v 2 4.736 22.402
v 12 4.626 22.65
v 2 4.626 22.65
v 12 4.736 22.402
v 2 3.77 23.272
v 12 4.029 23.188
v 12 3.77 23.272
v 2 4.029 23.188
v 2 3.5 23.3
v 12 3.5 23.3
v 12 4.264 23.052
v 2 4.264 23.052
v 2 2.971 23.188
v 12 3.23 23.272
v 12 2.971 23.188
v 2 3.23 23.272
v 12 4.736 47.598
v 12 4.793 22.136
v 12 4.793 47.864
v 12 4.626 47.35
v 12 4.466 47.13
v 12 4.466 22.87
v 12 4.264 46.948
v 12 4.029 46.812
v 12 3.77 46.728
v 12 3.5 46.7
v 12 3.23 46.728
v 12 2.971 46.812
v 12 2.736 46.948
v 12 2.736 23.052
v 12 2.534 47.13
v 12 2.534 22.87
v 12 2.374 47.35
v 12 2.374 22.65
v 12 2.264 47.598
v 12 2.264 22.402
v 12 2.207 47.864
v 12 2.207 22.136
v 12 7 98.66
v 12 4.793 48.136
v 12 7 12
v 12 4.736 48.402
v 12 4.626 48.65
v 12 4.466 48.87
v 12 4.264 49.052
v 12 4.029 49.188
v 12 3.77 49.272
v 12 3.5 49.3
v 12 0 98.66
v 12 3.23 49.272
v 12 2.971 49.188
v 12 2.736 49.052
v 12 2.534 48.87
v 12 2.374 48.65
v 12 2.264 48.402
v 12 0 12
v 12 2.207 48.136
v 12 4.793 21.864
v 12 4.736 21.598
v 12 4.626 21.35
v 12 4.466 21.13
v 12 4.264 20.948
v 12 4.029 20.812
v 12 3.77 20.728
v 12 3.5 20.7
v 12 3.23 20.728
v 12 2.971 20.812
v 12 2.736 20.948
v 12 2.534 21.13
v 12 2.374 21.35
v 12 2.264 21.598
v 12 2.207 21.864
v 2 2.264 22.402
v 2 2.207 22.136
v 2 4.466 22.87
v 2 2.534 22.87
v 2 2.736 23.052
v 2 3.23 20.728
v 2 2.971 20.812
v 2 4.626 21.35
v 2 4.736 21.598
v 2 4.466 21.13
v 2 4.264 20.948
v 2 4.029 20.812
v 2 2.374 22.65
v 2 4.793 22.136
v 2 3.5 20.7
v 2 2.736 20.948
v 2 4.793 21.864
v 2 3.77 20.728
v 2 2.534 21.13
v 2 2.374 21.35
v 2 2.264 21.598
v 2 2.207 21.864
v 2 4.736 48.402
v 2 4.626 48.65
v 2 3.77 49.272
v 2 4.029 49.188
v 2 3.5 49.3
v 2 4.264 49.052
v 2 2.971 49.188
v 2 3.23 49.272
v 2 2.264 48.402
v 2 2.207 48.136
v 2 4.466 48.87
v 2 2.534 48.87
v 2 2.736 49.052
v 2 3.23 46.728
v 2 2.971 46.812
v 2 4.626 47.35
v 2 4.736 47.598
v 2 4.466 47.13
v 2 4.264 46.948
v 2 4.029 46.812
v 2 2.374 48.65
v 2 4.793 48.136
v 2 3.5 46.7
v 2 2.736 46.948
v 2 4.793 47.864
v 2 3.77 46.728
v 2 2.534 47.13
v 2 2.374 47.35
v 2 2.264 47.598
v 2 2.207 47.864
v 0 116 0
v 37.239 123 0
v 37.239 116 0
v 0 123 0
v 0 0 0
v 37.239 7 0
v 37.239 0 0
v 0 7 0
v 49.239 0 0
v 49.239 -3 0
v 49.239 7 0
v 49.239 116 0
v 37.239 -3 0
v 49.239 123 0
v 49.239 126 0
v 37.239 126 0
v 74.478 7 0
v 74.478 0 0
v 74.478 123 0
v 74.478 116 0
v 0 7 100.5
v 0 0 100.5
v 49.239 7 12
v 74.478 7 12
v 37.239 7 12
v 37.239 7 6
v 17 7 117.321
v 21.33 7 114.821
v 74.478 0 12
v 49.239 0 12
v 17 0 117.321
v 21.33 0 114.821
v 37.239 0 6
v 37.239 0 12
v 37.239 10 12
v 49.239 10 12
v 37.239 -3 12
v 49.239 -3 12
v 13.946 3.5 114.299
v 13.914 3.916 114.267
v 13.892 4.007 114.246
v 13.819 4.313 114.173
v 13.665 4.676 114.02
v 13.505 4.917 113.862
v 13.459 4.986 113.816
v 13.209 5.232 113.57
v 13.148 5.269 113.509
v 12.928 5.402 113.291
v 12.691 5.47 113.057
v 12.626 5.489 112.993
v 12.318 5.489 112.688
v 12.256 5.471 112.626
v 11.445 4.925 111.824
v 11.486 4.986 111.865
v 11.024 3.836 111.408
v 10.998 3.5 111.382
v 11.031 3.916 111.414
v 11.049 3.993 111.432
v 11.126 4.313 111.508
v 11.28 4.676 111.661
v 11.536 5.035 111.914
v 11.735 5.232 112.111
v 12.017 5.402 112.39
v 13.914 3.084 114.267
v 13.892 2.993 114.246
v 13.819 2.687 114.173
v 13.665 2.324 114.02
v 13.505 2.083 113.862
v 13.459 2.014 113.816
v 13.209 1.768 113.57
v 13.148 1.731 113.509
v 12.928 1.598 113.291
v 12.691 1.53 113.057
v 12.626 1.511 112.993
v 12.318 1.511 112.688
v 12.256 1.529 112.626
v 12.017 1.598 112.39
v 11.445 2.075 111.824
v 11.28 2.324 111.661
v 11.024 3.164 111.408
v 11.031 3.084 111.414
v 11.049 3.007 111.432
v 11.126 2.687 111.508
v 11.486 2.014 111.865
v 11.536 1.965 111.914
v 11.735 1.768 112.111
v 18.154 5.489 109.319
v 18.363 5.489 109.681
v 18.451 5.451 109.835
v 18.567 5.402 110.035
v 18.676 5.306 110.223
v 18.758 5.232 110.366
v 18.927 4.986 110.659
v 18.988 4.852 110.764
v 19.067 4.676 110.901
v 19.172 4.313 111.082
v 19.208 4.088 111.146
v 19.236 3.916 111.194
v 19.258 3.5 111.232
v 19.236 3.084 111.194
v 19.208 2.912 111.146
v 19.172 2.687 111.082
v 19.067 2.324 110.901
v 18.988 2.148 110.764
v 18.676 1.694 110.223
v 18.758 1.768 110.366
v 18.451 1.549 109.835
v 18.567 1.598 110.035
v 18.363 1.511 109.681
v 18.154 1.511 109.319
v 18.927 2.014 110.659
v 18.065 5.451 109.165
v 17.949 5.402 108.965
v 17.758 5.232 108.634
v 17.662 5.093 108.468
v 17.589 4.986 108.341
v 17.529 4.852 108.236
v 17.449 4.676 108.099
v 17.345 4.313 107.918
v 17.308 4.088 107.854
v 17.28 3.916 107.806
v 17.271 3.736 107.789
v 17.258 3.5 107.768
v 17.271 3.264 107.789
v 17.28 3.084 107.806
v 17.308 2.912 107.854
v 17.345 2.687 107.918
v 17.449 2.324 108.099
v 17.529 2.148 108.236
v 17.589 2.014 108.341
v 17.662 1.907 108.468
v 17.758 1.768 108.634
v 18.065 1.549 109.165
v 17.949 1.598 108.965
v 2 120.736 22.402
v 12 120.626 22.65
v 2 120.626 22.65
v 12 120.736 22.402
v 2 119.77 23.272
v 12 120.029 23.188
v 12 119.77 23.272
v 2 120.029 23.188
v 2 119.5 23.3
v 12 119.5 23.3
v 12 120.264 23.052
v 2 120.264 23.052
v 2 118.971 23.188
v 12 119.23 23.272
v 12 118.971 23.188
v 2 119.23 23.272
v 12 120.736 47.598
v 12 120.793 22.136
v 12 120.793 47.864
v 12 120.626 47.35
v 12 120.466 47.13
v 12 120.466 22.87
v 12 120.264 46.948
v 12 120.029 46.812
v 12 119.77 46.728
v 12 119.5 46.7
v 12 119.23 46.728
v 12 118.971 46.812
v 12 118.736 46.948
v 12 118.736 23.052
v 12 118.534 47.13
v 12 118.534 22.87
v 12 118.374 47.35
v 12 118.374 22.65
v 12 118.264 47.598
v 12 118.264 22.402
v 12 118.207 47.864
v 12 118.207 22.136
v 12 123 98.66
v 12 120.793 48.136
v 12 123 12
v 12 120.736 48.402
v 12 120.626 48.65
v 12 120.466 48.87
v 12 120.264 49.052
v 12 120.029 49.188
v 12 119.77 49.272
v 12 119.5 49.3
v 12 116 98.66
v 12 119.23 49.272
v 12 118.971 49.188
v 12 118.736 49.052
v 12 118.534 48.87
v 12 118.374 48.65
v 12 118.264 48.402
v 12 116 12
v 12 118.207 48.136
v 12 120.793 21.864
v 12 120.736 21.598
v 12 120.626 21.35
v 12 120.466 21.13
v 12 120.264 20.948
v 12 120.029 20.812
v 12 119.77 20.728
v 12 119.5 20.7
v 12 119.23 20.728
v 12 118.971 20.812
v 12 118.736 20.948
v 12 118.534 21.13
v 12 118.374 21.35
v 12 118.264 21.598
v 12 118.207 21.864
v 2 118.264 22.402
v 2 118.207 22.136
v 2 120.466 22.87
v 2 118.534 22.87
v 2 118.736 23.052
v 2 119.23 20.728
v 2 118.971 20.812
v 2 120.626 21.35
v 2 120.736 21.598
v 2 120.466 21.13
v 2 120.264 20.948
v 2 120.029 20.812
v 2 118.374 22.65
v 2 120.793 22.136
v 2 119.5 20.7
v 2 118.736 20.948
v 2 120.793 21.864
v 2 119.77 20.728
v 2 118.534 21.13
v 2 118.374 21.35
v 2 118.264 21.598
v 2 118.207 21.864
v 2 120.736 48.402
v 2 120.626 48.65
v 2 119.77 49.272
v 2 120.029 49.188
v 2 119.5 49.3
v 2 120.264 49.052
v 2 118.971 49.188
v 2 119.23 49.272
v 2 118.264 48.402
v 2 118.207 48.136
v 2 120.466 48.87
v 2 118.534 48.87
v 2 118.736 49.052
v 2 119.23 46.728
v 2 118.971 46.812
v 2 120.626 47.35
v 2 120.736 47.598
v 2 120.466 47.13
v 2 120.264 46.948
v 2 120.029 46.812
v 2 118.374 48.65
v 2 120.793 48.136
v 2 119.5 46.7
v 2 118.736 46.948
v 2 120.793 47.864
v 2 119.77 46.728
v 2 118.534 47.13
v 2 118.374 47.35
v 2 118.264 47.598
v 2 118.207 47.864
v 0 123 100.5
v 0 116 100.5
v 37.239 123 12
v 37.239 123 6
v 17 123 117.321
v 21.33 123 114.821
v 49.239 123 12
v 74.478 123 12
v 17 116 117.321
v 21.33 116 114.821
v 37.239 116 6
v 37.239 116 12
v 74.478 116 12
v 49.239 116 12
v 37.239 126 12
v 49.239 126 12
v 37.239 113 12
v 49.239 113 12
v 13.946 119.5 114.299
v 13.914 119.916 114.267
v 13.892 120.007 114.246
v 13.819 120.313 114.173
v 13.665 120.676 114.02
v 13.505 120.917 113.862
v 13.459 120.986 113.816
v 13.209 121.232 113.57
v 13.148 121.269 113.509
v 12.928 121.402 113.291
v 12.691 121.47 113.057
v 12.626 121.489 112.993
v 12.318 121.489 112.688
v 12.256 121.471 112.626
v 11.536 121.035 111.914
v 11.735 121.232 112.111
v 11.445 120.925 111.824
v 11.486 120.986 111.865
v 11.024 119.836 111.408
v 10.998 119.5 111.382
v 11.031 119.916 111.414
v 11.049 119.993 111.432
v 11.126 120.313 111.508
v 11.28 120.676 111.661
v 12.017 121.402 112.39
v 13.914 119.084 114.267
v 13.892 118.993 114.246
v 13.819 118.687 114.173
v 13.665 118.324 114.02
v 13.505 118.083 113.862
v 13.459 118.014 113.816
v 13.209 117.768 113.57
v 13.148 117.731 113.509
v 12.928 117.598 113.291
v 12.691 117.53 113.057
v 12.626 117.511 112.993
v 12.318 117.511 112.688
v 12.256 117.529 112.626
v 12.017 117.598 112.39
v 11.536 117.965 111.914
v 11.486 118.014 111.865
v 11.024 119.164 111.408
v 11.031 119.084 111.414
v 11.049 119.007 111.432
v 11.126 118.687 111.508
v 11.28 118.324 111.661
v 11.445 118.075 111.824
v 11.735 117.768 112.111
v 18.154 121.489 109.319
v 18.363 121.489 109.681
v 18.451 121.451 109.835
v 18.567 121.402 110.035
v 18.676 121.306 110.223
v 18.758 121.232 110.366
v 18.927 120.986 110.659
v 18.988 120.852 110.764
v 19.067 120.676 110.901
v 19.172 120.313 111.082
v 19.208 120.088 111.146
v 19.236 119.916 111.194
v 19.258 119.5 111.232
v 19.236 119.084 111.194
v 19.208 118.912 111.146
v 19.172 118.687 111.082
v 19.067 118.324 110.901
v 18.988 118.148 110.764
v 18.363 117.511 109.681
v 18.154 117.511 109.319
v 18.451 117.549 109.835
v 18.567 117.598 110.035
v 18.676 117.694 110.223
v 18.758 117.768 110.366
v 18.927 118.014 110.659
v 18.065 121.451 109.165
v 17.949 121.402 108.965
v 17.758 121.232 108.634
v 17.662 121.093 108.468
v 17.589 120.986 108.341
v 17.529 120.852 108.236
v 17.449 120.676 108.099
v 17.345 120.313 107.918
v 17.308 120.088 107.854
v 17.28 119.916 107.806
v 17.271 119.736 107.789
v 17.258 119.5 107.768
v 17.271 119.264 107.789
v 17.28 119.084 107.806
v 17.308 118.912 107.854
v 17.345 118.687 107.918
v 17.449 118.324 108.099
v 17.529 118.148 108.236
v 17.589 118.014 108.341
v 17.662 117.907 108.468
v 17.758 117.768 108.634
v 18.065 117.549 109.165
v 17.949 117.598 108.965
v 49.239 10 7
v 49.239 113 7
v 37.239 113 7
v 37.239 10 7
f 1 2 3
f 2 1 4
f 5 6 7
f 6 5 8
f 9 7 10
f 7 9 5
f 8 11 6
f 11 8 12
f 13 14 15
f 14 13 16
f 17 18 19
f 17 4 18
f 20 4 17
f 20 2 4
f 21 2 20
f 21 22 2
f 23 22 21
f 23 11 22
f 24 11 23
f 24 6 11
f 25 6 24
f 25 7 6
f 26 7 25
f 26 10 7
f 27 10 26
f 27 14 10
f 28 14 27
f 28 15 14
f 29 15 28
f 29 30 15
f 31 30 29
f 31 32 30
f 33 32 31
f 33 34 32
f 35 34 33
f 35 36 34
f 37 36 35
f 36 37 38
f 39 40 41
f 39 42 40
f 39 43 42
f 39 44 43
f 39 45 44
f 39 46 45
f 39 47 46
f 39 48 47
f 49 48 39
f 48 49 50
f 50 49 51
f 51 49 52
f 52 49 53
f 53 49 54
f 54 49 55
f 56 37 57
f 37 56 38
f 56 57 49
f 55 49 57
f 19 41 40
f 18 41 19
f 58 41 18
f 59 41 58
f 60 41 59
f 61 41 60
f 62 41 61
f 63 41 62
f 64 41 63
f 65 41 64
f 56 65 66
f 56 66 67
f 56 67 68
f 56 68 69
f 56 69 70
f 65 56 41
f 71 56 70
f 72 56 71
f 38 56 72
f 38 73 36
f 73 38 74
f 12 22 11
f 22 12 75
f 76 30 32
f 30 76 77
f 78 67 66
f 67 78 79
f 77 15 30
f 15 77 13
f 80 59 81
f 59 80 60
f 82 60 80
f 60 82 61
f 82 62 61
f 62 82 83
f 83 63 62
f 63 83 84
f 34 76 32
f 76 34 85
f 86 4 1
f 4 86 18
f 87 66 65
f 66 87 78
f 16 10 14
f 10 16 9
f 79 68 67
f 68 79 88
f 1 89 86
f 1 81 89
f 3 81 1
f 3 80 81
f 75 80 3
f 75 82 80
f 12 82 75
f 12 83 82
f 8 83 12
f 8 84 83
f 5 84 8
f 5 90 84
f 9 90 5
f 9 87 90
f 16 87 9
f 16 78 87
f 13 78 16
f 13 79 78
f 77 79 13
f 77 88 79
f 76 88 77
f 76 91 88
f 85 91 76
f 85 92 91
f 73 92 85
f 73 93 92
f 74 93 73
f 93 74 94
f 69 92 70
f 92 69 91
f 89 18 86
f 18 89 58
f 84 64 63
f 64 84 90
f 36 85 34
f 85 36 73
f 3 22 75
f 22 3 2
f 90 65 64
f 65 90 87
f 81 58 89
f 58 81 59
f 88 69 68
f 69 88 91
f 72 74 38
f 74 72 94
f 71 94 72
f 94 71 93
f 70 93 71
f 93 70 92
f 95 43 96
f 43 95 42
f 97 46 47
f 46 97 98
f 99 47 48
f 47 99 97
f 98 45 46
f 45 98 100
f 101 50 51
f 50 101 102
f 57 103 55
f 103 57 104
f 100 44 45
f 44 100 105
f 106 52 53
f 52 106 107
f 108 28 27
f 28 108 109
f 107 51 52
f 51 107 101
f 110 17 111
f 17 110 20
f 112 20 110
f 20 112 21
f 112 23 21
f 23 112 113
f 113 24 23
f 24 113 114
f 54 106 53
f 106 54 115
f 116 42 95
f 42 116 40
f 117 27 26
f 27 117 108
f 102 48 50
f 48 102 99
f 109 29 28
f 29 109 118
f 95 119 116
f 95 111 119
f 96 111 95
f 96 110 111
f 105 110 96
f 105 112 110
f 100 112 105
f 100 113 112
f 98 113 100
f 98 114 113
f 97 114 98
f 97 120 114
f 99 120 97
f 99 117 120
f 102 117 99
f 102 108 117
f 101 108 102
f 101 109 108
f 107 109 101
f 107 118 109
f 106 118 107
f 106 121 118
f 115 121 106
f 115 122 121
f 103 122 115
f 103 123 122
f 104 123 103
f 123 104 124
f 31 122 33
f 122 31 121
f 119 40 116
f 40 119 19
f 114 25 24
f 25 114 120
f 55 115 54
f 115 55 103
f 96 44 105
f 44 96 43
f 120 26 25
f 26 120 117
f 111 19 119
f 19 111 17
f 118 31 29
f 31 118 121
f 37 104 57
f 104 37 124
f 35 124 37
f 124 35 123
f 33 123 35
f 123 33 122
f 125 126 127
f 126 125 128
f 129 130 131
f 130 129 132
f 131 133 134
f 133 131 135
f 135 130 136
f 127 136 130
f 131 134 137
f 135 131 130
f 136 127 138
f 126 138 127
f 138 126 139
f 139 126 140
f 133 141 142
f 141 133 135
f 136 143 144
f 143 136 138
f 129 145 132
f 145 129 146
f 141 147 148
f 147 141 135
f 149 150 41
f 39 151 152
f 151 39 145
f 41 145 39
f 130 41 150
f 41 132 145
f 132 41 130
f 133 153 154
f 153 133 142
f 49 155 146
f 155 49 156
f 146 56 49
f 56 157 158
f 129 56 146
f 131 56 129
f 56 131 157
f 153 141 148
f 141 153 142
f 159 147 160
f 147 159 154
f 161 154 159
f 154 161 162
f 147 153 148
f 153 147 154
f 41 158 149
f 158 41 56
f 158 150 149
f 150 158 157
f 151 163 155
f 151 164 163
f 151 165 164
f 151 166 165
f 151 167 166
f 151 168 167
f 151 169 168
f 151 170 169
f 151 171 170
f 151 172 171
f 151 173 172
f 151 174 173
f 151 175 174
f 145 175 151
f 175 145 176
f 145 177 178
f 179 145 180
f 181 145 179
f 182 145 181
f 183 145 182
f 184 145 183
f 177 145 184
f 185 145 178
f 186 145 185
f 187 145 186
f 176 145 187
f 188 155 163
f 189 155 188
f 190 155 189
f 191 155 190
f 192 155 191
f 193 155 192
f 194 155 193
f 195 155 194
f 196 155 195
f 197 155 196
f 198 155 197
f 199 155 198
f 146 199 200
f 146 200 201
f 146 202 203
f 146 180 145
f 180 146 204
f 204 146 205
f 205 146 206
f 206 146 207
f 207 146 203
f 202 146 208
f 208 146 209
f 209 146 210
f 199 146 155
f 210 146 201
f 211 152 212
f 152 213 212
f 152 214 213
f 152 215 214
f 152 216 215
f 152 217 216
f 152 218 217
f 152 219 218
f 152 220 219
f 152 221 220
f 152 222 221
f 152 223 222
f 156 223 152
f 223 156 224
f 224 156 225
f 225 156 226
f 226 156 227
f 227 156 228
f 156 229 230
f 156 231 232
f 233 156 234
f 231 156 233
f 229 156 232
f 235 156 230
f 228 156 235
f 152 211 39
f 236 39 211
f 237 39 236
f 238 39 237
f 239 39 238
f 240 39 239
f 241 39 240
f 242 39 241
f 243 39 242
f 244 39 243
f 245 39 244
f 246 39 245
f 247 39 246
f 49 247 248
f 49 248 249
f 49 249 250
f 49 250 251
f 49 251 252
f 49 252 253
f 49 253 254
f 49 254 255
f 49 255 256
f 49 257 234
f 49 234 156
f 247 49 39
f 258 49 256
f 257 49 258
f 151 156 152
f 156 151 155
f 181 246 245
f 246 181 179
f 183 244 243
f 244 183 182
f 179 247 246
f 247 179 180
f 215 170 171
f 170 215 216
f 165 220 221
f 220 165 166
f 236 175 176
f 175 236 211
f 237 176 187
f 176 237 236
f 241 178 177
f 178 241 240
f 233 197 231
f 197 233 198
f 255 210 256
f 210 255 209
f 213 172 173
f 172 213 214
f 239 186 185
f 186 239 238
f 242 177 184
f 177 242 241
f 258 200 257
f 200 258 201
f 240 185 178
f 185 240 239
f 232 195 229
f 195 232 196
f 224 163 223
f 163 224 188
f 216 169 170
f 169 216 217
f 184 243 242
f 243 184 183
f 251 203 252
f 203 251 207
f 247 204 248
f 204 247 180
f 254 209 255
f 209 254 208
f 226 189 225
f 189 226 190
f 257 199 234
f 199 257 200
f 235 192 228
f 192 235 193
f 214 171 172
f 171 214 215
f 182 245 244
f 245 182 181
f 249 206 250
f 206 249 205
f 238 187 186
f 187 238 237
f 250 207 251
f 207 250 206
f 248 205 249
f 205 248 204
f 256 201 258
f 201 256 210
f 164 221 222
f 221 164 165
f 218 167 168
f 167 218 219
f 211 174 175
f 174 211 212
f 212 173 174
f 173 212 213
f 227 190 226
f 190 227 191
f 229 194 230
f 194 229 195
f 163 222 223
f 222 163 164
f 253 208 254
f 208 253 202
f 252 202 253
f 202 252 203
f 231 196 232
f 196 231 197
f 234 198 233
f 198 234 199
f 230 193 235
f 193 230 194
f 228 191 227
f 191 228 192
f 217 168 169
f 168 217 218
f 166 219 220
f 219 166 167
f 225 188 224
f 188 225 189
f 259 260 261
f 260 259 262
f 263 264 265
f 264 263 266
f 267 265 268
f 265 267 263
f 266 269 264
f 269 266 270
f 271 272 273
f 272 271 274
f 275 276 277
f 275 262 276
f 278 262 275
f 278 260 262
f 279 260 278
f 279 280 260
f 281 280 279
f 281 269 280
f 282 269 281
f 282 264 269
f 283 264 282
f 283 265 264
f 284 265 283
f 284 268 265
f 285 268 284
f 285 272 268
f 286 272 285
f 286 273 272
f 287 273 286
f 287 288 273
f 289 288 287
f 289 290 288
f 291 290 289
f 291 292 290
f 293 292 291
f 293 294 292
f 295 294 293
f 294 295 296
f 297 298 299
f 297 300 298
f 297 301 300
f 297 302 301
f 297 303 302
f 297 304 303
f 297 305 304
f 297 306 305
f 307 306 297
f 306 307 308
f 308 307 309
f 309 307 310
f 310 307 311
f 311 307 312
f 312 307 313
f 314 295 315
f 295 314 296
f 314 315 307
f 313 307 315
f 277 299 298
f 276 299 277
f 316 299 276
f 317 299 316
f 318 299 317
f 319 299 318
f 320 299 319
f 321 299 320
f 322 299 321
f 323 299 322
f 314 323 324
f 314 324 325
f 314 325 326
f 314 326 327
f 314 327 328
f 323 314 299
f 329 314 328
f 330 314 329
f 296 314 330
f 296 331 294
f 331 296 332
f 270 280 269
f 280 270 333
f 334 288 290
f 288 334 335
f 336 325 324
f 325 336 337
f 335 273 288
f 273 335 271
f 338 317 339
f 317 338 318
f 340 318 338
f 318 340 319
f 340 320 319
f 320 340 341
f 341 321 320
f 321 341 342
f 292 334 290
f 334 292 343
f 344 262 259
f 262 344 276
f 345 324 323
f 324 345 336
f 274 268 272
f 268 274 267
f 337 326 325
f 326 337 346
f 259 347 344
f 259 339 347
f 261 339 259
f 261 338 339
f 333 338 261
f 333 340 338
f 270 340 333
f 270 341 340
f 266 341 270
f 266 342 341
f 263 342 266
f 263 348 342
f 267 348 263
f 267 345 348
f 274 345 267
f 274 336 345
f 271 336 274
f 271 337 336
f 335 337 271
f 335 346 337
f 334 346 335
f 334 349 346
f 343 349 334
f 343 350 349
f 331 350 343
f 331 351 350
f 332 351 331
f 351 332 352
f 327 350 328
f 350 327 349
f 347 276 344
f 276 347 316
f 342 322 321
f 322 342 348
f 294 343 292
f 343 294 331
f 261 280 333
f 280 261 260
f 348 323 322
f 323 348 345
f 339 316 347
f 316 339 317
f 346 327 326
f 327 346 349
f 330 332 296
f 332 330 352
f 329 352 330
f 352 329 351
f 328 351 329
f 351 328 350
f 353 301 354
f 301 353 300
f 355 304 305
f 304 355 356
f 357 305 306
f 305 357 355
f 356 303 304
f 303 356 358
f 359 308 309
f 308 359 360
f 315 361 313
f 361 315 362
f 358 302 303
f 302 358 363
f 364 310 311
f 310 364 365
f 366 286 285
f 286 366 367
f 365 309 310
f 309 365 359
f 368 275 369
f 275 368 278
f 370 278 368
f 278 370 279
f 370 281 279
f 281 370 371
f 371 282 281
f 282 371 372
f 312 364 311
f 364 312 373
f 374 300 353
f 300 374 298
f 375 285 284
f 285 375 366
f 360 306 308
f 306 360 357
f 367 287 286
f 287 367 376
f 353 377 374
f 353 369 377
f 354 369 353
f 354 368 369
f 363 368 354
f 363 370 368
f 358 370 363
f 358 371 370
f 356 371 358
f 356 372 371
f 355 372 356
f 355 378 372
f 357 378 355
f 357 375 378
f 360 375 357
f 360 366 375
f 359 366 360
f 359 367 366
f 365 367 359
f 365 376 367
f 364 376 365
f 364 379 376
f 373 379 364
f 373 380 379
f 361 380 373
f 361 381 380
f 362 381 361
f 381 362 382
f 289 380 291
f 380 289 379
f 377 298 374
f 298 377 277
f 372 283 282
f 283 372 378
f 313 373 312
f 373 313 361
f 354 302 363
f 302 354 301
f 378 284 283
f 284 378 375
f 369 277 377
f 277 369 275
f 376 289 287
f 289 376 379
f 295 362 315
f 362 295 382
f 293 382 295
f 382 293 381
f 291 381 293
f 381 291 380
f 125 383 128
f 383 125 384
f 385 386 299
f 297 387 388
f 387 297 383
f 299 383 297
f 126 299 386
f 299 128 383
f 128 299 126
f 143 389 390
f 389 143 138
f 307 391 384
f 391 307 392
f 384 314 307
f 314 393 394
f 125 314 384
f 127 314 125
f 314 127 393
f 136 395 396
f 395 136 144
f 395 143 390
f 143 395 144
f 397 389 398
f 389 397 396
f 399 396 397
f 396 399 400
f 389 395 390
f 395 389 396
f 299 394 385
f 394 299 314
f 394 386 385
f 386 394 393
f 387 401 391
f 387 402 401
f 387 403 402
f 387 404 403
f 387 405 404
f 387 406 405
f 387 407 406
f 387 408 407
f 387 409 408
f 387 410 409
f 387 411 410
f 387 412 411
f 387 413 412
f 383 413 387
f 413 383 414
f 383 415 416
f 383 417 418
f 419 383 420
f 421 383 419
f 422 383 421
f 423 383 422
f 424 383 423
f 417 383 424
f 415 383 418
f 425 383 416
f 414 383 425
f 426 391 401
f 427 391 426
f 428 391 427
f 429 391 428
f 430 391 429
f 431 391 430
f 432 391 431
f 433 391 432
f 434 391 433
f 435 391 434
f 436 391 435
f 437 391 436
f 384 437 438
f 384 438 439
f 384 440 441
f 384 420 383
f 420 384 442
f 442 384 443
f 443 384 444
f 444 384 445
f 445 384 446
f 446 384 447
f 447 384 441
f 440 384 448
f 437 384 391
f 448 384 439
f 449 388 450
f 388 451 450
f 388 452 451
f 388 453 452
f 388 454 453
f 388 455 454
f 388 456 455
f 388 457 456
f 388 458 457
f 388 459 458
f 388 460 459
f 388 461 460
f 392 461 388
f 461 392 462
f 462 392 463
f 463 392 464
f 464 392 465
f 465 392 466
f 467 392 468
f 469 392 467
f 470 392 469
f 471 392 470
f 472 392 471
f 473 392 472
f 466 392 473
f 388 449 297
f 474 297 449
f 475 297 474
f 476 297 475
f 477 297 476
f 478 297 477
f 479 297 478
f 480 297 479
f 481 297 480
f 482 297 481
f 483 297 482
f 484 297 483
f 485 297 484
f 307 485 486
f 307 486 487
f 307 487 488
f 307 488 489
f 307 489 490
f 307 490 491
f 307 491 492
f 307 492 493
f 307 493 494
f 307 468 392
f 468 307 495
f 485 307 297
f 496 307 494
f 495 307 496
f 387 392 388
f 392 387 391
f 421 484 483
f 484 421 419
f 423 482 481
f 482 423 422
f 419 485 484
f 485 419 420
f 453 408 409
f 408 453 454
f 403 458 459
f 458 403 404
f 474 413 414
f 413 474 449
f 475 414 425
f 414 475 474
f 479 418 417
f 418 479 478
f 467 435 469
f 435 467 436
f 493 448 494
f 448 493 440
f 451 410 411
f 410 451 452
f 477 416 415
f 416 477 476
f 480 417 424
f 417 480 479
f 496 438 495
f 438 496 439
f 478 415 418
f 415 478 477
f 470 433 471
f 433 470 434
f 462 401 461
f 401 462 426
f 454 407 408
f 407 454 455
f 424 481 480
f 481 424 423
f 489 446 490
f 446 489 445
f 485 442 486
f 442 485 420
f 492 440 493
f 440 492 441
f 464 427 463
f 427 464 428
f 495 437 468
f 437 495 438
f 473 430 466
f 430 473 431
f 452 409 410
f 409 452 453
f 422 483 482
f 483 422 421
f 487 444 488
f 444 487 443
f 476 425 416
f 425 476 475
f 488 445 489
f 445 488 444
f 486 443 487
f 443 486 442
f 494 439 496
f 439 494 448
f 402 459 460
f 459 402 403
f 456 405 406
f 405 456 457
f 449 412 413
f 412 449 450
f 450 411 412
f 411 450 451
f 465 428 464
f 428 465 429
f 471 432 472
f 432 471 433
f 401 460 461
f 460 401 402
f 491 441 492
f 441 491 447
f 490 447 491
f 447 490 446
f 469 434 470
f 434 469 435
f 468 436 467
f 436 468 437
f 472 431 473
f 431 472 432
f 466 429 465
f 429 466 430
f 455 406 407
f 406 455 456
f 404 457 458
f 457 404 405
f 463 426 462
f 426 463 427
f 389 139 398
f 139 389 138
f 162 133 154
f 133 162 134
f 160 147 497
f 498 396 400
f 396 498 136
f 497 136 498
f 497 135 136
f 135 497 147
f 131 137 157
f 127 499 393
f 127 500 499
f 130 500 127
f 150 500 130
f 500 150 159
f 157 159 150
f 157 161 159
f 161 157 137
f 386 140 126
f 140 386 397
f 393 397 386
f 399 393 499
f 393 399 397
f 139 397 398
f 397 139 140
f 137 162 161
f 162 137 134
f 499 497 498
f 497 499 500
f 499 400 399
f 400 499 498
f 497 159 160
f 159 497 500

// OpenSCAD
fan_height = 109;
fan_angle = 30;
mount_length = 20;
$fn=30;

module foot() {
    height = 100;
    thickness = [12, 7];
    regulator_hole_diameter = 2.6;
    mount_hole_diameter = 4;
    length = tan(fan_angle) * (fan_height + mount_length);
//    length = tan(fan_angle) * fan_height;

    difference() {
        cube([thickness[0], thickness[1], height]);
        
        rotate([0, -90, 0])
        translate([thickness[0] + 10, 
                     thickness[1]/2,
                     -thickness[0]]) {
            cylinder(d=regulator_hole_diameter,
                       h=thickness[0]-2);
            translate ([26,0,0])
            cylinder(d=regulator_hole_diameter,
                       h=thickness[0]-2);
        }
    }
    
    difference() {
    cube([length, thickness[1], thickness[0]]);
        translate([length/2, -1, thickness[0]/2])
        
        // The Connector placeholder
        cube([thickness[0], thickness[1]+2, thickness[0]]);
    }
    
    difference() {
        hull() {
            translate([thickness[0]-5, 0, height]) {
                rotate([0, fan_angle, 0])
                cube([5, thickness[1], mount_length]);
            }
            translate([thickness[0]/2, thickness[1]/2, height]) {
                cube([thickness[0], thickness[1], 1], center=true);
            }
        }
        translate([thickness[0]-5, thickness[1]/2, height + mount_length-4]) {
            rotate([0, 90 + fan_angle, 0])
            cylinder(h=30, d=mount_hole_diameter, $fn=30);
        }
    }
}

module connector() {
    thickness = 12;
    overhang = 3;
    width = fan_height;
    foot_thickness = [12, 7];
    
    difference() {
        cube([thickness,
               width + foot_thickness[1] * 2 + overhang * 2,
               thickness]);
        
        translate([-1, overhang, -thickness/2])
        cube([thickness+2, foot_thickness[1], thickness]);

        translate([-1, 
                     overhang + foot_thickness [1]+ width, 
                     -thickness/2])
        cube([thickness+2, foot_thickness[1], thickness]);
        translate([0, overhang * 2 + foot_thickness[1], foot_thickness[1]])
        cube([thickness, width - overhang * 2, 10]);
    }
}

// Print one of each
translate([0, 0,   0]) foot();
translate([0, 116, 0]) foot();
translate([tan(fan_angle) * (fan_height + mount_length)/2, -3, 0]) connector();
